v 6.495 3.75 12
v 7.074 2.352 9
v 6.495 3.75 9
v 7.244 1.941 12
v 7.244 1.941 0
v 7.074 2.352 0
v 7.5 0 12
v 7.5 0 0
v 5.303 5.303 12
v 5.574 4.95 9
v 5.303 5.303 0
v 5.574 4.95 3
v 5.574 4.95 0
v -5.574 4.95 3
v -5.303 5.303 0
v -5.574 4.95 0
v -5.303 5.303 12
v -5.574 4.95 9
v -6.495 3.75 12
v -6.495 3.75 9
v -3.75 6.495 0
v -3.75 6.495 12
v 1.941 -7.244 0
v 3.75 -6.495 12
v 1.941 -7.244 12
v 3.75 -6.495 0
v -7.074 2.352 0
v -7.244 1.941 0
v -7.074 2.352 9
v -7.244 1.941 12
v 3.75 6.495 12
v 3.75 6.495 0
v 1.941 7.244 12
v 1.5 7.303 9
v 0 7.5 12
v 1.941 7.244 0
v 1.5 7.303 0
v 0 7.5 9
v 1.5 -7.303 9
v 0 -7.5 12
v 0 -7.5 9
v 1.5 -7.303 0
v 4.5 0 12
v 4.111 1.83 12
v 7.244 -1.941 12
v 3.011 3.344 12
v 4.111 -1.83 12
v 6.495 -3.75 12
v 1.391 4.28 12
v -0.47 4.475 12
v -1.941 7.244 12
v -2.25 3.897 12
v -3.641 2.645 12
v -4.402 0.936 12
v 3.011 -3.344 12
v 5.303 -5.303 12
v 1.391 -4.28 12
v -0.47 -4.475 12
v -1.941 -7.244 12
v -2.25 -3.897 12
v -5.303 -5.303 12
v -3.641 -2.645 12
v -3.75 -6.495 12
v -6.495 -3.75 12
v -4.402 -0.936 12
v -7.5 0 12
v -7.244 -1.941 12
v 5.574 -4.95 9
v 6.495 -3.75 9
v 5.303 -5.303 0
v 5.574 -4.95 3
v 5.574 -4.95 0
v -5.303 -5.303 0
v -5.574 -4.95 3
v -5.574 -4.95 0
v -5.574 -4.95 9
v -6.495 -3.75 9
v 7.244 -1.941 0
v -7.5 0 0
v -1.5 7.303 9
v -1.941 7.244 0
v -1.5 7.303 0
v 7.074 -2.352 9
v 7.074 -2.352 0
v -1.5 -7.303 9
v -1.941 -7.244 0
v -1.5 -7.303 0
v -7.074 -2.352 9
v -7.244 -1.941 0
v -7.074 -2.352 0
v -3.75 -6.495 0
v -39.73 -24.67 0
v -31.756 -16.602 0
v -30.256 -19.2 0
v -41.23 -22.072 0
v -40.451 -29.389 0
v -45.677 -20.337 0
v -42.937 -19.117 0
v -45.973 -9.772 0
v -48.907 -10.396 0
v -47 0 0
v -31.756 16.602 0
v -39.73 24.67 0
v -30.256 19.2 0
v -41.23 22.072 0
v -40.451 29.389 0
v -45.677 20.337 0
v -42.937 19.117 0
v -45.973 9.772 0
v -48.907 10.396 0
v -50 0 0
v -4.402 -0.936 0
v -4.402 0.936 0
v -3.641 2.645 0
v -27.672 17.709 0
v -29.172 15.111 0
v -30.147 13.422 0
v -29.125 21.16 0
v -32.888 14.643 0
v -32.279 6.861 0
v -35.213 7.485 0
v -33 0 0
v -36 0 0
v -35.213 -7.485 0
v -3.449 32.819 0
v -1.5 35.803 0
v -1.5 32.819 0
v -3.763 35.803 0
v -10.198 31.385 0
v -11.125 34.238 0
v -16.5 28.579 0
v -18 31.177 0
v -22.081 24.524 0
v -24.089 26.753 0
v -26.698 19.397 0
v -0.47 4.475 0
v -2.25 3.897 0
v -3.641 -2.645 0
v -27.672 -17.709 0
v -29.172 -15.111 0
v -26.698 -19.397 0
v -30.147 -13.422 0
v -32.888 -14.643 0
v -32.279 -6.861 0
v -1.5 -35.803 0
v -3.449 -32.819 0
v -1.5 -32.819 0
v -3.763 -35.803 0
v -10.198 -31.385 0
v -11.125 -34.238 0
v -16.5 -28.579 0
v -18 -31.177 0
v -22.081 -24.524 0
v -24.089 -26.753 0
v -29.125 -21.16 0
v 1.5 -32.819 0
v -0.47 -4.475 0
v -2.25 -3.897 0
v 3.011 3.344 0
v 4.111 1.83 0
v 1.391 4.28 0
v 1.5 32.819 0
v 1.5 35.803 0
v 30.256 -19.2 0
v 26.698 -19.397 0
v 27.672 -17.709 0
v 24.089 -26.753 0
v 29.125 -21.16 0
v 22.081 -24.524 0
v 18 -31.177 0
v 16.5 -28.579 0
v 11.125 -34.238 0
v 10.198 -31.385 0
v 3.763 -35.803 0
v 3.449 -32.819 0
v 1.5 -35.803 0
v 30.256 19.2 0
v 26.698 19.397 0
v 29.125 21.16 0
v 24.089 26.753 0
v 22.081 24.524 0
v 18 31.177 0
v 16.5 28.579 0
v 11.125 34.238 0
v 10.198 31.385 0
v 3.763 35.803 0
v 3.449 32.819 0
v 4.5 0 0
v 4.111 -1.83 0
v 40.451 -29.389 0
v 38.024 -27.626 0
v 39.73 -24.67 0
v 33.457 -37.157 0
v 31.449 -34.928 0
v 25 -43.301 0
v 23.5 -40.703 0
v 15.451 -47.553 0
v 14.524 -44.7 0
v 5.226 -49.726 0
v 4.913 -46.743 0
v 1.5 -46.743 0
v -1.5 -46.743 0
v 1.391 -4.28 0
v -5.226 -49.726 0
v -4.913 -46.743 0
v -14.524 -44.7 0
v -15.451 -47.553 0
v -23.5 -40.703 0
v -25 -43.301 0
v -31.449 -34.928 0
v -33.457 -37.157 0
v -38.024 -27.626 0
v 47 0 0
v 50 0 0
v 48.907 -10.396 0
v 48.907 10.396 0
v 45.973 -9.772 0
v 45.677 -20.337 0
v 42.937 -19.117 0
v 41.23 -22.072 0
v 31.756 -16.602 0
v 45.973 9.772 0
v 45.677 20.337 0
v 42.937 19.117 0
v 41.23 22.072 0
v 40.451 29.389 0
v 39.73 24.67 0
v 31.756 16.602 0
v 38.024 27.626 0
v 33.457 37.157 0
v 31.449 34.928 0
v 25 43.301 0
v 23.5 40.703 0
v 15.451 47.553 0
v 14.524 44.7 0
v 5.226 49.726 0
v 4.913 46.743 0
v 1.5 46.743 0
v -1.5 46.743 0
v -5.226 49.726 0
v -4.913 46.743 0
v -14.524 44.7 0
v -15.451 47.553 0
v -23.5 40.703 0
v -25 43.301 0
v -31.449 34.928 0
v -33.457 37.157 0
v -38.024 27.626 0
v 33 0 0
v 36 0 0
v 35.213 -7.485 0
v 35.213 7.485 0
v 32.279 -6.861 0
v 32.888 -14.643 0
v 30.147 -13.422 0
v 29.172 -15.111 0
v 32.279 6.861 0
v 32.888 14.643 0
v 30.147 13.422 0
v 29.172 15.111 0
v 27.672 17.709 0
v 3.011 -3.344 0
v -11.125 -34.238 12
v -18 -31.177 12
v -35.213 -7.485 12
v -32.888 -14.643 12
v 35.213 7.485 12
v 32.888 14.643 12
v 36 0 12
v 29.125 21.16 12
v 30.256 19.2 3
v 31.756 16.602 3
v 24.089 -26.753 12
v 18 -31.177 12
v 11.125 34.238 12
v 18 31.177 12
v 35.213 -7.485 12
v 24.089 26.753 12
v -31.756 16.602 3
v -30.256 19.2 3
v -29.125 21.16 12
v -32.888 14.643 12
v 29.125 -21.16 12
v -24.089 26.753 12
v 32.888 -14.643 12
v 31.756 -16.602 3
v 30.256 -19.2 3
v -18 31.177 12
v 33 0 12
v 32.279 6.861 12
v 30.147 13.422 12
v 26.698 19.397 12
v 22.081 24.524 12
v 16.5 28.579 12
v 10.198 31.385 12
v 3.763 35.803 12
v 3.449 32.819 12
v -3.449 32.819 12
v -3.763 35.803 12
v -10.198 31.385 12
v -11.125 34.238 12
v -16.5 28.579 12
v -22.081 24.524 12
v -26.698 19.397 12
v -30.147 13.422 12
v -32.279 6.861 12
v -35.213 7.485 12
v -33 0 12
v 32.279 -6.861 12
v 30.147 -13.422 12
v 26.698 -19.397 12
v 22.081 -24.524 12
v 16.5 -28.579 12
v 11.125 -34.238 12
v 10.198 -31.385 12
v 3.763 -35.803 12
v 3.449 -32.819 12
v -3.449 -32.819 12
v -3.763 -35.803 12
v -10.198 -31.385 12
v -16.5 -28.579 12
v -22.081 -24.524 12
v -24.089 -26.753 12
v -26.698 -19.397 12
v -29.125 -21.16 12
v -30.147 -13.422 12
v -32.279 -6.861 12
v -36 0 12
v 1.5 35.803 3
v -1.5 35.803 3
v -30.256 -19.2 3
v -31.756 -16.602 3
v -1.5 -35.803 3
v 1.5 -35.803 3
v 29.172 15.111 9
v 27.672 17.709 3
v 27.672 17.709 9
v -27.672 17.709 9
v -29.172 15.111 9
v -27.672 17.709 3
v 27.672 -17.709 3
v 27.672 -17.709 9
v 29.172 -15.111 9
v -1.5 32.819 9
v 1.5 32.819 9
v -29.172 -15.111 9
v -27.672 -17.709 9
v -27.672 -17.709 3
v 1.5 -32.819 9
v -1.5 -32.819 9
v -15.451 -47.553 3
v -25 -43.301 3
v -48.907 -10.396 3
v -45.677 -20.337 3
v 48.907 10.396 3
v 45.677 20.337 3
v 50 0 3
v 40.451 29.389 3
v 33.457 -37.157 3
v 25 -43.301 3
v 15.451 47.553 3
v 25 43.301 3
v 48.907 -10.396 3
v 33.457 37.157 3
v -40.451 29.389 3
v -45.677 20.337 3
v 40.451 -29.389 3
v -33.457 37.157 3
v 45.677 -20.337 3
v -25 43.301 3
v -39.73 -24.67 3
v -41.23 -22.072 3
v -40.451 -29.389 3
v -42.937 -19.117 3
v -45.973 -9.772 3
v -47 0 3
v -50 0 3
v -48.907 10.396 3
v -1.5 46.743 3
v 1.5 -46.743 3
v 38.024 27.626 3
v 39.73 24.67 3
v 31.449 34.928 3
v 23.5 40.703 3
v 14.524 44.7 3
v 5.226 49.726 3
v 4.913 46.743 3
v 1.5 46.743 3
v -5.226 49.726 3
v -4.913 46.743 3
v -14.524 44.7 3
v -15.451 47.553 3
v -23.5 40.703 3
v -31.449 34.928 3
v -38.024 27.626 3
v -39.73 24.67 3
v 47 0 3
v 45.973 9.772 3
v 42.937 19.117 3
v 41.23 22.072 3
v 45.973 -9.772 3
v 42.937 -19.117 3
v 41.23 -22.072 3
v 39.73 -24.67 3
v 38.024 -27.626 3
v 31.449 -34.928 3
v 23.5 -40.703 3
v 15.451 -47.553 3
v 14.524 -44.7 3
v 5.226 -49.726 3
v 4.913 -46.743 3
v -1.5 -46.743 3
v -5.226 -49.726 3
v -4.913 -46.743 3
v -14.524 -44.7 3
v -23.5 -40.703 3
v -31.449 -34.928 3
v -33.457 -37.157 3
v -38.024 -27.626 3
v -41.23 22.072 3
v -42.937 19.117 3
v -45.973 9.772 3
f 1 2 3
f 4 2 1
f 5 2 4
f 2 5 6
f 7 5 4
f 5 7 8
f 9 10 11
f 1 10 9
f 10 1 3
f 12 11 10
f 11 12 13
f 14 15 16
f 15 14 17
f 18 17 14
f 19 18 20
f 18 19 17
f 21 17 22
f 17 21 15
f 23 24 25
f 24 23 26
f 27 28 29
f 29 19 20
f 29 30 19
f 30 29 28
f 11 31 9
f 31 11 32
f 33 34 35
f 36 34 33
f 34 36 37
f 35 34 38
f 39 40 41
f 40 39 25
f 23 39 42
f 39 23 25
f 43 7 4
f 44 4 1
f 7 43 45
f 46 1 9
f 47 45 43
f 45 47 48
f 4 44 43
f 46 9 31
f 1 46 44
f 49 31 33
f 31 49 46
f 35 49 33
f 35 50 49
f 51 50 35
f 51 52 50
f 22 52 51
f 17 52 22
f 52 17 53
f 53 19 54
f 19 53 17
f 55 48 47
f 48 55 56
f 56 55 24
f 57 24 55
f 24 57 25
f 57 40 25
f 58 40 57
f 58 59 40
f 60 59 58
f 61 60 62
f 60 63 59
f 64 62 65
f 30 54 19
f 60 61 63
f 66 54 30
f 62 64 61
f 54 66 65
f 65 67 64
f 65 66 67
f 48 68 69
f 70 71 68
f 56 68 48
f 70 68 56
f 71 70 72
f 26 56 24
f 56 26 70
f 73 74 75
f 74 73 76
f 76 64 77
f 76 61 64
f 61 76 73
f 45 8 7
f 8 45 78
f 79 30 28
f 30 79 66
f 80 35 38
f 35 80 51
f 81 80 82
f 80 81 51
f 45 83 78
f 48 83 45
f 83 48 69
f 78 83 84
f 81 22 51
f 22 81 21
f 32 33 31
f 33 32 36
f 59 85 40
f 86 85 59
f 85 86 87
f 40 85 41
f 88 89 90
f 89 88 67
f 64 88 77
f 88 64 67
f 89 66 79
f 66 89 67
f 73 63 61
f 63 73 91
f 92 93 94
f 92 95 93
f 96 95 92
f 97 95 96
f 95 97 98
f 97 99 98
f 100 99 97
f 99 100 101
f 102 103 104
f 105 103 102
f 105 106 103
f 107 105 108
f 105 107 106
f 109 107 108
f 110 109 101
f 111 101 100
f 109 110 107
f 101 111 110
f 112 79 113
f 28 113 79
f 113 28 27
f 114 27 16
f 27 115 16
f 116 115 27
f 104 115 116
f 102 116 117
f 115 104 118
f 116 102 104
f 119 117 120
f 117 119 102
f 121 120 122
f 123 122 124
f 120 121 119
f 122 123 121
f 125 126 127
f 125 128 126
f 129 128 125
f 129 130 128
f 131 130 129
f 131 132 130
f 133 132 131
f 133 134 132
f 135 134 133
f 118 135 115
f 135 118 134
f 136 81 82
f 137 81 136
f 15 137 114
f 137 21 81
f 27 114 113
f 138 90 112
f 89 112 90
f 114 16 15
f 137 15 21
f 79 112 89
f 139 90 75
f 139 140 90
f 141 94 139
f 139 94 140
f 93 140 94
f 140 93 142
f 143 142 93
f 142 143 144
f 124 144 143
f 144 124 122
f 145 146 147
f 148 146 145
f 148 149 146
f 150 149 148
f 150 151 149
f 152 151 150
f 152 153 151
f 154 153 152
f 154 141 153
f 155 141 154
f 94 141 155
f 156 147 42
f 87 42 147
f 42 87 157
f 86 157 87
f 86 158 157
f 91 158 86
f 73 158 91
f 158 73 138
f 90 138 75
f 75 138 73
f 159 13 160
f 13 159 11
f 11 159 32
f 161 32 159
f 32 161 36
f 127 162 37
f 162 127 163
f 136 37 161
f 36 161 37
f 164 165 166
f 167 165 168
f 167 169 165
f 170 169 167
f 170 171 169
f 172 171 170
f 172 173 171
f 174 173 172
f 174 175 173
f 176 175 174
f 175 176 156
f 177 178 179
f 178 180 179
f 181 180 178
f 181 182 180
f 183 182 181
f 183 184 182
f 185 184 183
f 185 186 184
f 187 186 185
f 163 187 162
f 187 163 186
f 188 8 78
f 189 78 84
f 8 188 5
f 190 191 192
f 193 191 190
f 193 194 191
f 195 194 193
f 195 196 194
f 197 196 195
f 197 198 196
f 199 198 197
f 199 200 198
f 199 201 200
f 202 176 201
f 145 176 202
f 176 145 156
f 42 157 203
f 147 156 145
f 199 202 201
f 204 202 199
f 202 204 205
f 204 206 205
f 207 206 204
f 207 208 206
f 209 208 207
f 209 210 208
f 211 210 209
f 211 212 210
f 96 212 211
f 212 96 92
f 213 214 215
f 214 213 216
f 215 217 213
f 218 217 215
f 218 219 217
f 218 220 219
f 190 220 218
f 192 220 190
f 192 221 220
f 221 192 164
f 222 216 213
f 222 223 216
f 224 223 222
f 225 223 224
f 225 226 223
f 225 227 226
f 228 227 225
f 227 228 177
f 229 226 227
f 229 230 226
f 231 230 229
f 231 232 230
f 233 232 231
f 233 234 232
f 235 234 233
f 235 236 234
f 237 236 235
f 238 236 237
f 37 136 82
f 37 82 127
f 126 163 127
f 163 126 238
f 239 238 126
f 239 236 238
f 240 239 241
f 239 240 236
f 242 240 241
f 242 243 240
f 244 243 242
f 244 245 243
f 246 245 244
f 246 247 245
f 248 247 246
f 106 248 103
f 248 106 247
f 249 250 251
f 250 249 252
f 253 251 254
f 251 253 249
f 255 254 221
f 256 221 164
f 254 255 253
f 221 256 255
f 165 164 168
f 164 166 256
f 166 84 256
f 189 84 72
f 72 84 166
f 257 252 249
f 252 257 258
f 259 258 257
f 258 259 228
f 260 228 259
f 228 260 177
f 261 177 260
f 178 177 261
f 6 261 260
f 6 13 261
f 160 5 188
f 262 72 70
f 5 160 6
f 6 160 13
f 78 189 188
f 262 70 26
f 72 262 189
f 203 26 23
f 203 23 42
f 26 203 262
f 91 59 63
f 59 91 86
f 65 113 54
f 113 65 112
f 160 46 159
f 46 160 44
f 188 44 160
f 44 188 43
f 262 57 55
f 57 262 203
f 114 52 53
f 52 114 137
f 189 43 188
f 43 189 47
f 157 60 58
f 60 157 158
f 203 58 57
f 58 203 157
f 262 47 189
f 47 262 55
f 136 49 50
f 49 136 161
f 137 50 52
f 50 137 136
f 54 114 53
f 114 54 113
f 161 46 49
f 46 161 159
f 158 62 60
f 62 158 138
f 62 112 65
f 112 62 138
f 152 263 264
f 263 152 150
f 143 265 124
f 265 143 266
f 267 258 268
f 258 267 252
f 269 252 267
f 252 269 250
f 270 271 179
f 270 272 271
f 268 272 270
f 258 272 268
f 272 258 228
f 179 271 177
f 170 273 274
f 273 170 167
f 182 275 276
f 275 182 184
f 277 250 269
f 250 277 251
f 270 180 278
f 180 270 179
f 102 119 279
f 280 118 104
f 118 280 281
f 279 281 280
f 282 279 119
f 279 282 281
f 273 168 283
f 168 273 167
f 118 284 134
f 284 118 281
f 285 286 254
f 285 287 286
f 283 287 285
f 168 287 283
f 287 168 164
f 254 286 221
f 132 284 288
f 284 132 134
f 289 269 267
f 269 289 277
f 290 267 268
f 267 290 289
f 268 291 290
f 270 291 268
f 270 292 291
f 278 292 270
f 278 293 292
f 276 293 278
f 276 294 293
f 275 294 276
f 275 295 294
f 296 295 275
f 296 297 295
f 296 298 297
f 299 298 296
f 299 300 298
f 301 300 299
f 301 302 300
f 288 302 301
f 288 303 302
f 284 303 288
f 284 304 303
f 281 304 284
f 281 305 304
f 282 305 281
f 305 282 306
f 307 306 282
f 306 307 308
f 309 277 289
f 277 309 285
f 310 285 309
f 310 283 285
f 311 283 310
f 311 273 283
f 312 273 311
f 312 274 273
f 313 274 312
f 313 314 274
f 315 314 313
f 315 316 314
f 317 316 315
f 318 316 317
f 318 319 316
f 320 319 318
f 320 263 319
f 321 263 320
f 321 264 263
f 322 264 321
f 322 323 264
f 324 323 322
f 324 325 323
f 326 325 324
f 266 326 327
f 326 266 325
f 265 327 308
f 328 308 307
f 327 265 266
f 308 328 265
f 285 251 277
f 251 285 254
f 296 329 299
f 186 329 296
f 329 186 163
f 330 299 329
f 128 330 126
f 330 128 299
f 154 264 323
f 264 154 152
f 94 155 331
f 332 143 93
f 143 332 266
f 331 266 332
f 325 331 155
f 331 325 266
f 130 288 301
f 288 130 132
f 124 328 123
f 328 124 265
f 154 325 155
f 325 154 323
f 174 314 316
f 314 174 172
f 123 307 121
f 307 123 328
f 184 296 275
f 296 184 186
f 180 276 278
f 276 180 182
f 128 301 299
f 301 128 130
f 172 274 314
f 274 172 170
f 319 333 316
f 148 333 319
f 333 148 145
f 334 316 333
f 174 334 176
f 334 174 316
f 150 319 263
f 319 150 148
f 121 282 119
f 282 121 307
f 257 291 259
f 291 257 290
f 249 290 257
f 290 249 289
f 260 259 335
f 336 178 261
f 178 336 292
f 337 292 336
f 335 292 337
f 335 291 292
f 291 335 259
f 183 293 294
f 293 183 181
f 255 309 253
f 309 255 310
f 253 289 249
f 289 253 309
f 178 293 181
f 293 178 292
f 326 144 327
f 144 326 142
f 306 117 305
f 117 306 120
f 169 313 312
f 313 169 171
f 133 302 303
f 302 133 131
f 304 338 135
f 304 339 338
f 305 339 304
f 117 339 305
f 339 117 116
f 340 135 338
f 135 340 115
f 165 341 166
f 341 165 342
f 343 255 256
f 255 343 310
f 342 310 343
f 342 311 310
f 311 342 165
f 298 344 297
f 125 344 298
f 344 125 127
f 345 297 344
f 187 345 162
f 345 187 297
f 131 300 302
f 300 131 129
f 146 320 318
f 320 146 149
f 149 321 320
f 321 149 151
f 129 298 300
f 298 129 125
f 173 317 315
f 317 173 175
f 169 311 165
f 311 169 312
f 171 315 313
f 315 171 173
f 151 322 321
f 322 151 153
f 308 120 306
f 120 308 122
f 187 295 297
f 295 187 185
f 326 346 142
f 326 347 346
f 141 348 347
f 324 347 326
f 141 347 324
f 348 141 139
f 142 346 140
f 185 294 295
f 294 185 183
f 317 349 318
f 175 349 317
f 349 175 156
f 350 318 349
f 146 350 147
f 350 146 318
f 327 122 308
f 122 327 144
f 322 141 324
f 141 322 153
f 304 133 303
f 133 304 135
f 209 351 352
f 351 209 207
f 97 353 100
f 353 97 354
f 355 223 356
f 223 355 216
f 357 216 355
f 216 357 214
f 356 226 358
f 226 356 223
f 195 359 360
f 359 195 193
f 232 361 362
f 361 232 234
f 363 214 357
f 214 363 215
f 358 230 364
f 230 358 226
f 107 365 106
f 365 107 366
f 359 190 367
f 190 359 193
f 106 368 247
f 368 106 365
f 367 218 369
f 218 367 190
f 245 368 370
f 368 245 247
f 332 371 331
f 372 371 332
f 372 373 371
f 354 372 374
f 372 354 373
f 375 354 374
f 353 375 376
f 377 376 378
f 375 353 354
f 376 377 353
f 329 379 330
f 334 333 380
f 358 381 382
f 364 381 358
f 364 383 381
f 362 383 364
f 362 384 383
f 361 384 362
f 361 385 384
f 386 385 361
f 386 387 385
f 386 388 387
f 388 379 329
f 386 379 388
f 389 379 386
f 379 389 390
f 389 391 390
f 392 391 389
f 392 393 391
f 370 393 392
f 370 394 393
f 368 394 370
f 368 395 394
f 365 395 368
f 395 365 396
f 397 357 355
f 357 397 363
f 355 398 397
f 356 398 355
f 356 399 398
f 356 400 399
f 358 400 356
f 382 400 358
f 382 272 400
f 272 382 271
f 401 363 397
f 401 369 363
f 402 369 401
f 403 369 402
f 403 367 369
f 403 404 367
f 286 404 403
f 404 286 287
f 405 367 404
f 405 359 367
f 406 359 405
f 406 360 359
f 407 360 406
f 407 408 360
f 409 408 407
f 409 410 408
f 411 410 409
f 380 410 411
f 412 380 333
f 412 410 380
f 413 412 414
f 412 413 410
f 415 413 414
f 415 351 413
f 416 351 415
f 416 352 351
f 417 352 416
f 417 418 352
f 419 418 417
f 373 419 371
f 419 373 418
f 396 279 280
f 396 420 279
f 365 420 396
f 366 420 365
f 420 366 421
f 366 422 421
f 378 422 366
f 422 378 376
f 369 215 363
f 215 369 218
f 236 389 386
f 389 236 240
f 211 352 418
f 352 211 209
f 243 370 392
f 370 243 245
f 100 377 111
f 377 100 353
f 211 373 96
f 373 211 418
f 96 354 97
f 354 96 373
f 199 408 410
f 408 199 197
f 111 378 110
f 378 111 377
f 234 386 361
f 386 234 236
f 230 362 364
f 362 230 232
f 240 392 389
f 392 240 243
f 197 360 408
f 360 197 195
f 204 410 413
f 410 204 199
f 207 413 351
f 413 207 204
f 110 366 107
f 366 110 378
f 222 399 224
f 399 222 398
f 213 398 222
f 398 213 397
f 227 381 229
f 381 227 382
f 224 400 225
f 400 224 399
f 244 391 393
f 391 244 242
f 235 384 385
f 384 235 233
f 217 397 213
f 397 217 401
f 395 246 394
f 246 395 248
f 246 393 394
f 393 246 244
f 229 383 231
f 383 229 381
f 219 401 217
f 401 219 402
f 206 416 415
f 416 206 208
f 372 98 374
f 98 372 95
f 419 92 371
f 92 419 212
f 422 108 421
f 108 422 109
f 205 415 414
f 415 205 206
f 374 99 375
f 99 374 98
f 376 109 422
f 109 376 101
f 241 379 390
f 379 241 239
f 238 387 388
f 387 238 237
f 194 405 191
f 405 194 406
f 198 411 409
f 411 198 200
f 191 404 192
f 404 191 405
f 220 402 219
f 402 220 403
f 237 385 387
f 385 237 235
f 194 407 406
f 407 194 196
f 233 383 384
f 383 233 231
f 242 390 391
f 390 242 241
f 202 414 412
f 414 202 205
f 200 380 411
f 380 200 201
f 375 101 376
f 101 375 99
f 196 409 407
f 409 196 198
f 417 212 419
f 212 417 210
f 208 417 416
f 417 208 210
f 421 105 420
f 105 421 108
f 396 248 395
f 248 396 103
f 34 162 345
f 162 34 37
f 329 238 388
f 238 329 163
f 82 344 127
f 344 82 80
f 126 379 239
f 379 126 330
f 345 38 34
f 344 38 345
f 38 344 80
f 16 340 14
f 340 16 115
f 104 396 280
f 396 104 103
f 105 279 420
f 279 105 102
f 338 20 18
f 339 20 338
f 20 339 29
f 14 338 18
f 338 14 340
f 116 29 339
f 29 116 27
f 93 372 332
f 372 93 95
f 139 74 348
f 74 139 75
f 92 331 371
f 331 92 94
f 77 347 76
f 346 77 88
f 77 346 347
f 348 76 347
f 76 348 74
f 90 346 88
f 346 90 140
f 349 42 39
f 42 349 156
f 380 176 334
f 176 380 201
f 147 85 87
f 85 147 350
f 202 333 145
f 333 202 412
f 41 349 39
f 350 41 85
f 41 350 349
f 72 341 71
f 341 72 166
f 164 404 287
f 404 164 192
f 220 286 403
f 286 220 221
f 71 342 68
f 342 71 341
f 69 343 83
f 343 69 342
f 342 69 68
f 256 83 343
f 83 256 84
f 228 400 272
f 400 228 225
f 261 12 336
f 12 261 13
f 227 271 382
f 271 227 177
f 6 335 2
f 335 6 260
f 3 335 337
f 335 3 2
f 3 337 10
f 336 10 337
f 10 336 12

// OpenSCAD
rod_radius = 4.5;
inner_radius = 36;
outer_radius = 50;
thickness = 3;


hole_r = (outer_radius - inner_radius - 2 * thickness) / 2;


module ring(radius, width, height) {
	difference () {
		cylinder(r = radius, h = height);
		translate([0,0,-height/100])
		cylinder(r = radius - width, h = height + height/50);
	}
}


//difference () {
//	union () {
//		cylinder(r = outer_radius, h = thickness);
//		cylinder(r = inner_radius, h = thickness * 3);
//	}
//	
//	translate([0, 0, thickness])
//	cylinder(r = inner_radius - thickness, h = thickness * 2);

//	cylinder(r = rod_radius, h = thickness);
	
//	for (i = [0 : 5]) {
//		translate([0, inner_radius + thickness + hole_r, 0])
//		cylinder(r = hole_r, h = thickness);
//	}
//}


ring(rod_radius + thickness, thickness, thickness * 4);

ring(inner_radius, thickness, thickness * 4);

ring(outer_radius, thickness, thickness);

for (i = [0 : 5]) {
	rotate([0, 0, 60 * i])
	translate([-thickness / 2, rod_radius, 0])
	cube([thickness, outer_radius - rod_radius - thickness / 2, thickness]);
	
	rotate([0, 0, 60 * i])
	translate([-thickness / 2, rod_radius, 0])
	cube([thickness, inner_radius - rod_radius - thickness / 2, thickness * 3]);
}
